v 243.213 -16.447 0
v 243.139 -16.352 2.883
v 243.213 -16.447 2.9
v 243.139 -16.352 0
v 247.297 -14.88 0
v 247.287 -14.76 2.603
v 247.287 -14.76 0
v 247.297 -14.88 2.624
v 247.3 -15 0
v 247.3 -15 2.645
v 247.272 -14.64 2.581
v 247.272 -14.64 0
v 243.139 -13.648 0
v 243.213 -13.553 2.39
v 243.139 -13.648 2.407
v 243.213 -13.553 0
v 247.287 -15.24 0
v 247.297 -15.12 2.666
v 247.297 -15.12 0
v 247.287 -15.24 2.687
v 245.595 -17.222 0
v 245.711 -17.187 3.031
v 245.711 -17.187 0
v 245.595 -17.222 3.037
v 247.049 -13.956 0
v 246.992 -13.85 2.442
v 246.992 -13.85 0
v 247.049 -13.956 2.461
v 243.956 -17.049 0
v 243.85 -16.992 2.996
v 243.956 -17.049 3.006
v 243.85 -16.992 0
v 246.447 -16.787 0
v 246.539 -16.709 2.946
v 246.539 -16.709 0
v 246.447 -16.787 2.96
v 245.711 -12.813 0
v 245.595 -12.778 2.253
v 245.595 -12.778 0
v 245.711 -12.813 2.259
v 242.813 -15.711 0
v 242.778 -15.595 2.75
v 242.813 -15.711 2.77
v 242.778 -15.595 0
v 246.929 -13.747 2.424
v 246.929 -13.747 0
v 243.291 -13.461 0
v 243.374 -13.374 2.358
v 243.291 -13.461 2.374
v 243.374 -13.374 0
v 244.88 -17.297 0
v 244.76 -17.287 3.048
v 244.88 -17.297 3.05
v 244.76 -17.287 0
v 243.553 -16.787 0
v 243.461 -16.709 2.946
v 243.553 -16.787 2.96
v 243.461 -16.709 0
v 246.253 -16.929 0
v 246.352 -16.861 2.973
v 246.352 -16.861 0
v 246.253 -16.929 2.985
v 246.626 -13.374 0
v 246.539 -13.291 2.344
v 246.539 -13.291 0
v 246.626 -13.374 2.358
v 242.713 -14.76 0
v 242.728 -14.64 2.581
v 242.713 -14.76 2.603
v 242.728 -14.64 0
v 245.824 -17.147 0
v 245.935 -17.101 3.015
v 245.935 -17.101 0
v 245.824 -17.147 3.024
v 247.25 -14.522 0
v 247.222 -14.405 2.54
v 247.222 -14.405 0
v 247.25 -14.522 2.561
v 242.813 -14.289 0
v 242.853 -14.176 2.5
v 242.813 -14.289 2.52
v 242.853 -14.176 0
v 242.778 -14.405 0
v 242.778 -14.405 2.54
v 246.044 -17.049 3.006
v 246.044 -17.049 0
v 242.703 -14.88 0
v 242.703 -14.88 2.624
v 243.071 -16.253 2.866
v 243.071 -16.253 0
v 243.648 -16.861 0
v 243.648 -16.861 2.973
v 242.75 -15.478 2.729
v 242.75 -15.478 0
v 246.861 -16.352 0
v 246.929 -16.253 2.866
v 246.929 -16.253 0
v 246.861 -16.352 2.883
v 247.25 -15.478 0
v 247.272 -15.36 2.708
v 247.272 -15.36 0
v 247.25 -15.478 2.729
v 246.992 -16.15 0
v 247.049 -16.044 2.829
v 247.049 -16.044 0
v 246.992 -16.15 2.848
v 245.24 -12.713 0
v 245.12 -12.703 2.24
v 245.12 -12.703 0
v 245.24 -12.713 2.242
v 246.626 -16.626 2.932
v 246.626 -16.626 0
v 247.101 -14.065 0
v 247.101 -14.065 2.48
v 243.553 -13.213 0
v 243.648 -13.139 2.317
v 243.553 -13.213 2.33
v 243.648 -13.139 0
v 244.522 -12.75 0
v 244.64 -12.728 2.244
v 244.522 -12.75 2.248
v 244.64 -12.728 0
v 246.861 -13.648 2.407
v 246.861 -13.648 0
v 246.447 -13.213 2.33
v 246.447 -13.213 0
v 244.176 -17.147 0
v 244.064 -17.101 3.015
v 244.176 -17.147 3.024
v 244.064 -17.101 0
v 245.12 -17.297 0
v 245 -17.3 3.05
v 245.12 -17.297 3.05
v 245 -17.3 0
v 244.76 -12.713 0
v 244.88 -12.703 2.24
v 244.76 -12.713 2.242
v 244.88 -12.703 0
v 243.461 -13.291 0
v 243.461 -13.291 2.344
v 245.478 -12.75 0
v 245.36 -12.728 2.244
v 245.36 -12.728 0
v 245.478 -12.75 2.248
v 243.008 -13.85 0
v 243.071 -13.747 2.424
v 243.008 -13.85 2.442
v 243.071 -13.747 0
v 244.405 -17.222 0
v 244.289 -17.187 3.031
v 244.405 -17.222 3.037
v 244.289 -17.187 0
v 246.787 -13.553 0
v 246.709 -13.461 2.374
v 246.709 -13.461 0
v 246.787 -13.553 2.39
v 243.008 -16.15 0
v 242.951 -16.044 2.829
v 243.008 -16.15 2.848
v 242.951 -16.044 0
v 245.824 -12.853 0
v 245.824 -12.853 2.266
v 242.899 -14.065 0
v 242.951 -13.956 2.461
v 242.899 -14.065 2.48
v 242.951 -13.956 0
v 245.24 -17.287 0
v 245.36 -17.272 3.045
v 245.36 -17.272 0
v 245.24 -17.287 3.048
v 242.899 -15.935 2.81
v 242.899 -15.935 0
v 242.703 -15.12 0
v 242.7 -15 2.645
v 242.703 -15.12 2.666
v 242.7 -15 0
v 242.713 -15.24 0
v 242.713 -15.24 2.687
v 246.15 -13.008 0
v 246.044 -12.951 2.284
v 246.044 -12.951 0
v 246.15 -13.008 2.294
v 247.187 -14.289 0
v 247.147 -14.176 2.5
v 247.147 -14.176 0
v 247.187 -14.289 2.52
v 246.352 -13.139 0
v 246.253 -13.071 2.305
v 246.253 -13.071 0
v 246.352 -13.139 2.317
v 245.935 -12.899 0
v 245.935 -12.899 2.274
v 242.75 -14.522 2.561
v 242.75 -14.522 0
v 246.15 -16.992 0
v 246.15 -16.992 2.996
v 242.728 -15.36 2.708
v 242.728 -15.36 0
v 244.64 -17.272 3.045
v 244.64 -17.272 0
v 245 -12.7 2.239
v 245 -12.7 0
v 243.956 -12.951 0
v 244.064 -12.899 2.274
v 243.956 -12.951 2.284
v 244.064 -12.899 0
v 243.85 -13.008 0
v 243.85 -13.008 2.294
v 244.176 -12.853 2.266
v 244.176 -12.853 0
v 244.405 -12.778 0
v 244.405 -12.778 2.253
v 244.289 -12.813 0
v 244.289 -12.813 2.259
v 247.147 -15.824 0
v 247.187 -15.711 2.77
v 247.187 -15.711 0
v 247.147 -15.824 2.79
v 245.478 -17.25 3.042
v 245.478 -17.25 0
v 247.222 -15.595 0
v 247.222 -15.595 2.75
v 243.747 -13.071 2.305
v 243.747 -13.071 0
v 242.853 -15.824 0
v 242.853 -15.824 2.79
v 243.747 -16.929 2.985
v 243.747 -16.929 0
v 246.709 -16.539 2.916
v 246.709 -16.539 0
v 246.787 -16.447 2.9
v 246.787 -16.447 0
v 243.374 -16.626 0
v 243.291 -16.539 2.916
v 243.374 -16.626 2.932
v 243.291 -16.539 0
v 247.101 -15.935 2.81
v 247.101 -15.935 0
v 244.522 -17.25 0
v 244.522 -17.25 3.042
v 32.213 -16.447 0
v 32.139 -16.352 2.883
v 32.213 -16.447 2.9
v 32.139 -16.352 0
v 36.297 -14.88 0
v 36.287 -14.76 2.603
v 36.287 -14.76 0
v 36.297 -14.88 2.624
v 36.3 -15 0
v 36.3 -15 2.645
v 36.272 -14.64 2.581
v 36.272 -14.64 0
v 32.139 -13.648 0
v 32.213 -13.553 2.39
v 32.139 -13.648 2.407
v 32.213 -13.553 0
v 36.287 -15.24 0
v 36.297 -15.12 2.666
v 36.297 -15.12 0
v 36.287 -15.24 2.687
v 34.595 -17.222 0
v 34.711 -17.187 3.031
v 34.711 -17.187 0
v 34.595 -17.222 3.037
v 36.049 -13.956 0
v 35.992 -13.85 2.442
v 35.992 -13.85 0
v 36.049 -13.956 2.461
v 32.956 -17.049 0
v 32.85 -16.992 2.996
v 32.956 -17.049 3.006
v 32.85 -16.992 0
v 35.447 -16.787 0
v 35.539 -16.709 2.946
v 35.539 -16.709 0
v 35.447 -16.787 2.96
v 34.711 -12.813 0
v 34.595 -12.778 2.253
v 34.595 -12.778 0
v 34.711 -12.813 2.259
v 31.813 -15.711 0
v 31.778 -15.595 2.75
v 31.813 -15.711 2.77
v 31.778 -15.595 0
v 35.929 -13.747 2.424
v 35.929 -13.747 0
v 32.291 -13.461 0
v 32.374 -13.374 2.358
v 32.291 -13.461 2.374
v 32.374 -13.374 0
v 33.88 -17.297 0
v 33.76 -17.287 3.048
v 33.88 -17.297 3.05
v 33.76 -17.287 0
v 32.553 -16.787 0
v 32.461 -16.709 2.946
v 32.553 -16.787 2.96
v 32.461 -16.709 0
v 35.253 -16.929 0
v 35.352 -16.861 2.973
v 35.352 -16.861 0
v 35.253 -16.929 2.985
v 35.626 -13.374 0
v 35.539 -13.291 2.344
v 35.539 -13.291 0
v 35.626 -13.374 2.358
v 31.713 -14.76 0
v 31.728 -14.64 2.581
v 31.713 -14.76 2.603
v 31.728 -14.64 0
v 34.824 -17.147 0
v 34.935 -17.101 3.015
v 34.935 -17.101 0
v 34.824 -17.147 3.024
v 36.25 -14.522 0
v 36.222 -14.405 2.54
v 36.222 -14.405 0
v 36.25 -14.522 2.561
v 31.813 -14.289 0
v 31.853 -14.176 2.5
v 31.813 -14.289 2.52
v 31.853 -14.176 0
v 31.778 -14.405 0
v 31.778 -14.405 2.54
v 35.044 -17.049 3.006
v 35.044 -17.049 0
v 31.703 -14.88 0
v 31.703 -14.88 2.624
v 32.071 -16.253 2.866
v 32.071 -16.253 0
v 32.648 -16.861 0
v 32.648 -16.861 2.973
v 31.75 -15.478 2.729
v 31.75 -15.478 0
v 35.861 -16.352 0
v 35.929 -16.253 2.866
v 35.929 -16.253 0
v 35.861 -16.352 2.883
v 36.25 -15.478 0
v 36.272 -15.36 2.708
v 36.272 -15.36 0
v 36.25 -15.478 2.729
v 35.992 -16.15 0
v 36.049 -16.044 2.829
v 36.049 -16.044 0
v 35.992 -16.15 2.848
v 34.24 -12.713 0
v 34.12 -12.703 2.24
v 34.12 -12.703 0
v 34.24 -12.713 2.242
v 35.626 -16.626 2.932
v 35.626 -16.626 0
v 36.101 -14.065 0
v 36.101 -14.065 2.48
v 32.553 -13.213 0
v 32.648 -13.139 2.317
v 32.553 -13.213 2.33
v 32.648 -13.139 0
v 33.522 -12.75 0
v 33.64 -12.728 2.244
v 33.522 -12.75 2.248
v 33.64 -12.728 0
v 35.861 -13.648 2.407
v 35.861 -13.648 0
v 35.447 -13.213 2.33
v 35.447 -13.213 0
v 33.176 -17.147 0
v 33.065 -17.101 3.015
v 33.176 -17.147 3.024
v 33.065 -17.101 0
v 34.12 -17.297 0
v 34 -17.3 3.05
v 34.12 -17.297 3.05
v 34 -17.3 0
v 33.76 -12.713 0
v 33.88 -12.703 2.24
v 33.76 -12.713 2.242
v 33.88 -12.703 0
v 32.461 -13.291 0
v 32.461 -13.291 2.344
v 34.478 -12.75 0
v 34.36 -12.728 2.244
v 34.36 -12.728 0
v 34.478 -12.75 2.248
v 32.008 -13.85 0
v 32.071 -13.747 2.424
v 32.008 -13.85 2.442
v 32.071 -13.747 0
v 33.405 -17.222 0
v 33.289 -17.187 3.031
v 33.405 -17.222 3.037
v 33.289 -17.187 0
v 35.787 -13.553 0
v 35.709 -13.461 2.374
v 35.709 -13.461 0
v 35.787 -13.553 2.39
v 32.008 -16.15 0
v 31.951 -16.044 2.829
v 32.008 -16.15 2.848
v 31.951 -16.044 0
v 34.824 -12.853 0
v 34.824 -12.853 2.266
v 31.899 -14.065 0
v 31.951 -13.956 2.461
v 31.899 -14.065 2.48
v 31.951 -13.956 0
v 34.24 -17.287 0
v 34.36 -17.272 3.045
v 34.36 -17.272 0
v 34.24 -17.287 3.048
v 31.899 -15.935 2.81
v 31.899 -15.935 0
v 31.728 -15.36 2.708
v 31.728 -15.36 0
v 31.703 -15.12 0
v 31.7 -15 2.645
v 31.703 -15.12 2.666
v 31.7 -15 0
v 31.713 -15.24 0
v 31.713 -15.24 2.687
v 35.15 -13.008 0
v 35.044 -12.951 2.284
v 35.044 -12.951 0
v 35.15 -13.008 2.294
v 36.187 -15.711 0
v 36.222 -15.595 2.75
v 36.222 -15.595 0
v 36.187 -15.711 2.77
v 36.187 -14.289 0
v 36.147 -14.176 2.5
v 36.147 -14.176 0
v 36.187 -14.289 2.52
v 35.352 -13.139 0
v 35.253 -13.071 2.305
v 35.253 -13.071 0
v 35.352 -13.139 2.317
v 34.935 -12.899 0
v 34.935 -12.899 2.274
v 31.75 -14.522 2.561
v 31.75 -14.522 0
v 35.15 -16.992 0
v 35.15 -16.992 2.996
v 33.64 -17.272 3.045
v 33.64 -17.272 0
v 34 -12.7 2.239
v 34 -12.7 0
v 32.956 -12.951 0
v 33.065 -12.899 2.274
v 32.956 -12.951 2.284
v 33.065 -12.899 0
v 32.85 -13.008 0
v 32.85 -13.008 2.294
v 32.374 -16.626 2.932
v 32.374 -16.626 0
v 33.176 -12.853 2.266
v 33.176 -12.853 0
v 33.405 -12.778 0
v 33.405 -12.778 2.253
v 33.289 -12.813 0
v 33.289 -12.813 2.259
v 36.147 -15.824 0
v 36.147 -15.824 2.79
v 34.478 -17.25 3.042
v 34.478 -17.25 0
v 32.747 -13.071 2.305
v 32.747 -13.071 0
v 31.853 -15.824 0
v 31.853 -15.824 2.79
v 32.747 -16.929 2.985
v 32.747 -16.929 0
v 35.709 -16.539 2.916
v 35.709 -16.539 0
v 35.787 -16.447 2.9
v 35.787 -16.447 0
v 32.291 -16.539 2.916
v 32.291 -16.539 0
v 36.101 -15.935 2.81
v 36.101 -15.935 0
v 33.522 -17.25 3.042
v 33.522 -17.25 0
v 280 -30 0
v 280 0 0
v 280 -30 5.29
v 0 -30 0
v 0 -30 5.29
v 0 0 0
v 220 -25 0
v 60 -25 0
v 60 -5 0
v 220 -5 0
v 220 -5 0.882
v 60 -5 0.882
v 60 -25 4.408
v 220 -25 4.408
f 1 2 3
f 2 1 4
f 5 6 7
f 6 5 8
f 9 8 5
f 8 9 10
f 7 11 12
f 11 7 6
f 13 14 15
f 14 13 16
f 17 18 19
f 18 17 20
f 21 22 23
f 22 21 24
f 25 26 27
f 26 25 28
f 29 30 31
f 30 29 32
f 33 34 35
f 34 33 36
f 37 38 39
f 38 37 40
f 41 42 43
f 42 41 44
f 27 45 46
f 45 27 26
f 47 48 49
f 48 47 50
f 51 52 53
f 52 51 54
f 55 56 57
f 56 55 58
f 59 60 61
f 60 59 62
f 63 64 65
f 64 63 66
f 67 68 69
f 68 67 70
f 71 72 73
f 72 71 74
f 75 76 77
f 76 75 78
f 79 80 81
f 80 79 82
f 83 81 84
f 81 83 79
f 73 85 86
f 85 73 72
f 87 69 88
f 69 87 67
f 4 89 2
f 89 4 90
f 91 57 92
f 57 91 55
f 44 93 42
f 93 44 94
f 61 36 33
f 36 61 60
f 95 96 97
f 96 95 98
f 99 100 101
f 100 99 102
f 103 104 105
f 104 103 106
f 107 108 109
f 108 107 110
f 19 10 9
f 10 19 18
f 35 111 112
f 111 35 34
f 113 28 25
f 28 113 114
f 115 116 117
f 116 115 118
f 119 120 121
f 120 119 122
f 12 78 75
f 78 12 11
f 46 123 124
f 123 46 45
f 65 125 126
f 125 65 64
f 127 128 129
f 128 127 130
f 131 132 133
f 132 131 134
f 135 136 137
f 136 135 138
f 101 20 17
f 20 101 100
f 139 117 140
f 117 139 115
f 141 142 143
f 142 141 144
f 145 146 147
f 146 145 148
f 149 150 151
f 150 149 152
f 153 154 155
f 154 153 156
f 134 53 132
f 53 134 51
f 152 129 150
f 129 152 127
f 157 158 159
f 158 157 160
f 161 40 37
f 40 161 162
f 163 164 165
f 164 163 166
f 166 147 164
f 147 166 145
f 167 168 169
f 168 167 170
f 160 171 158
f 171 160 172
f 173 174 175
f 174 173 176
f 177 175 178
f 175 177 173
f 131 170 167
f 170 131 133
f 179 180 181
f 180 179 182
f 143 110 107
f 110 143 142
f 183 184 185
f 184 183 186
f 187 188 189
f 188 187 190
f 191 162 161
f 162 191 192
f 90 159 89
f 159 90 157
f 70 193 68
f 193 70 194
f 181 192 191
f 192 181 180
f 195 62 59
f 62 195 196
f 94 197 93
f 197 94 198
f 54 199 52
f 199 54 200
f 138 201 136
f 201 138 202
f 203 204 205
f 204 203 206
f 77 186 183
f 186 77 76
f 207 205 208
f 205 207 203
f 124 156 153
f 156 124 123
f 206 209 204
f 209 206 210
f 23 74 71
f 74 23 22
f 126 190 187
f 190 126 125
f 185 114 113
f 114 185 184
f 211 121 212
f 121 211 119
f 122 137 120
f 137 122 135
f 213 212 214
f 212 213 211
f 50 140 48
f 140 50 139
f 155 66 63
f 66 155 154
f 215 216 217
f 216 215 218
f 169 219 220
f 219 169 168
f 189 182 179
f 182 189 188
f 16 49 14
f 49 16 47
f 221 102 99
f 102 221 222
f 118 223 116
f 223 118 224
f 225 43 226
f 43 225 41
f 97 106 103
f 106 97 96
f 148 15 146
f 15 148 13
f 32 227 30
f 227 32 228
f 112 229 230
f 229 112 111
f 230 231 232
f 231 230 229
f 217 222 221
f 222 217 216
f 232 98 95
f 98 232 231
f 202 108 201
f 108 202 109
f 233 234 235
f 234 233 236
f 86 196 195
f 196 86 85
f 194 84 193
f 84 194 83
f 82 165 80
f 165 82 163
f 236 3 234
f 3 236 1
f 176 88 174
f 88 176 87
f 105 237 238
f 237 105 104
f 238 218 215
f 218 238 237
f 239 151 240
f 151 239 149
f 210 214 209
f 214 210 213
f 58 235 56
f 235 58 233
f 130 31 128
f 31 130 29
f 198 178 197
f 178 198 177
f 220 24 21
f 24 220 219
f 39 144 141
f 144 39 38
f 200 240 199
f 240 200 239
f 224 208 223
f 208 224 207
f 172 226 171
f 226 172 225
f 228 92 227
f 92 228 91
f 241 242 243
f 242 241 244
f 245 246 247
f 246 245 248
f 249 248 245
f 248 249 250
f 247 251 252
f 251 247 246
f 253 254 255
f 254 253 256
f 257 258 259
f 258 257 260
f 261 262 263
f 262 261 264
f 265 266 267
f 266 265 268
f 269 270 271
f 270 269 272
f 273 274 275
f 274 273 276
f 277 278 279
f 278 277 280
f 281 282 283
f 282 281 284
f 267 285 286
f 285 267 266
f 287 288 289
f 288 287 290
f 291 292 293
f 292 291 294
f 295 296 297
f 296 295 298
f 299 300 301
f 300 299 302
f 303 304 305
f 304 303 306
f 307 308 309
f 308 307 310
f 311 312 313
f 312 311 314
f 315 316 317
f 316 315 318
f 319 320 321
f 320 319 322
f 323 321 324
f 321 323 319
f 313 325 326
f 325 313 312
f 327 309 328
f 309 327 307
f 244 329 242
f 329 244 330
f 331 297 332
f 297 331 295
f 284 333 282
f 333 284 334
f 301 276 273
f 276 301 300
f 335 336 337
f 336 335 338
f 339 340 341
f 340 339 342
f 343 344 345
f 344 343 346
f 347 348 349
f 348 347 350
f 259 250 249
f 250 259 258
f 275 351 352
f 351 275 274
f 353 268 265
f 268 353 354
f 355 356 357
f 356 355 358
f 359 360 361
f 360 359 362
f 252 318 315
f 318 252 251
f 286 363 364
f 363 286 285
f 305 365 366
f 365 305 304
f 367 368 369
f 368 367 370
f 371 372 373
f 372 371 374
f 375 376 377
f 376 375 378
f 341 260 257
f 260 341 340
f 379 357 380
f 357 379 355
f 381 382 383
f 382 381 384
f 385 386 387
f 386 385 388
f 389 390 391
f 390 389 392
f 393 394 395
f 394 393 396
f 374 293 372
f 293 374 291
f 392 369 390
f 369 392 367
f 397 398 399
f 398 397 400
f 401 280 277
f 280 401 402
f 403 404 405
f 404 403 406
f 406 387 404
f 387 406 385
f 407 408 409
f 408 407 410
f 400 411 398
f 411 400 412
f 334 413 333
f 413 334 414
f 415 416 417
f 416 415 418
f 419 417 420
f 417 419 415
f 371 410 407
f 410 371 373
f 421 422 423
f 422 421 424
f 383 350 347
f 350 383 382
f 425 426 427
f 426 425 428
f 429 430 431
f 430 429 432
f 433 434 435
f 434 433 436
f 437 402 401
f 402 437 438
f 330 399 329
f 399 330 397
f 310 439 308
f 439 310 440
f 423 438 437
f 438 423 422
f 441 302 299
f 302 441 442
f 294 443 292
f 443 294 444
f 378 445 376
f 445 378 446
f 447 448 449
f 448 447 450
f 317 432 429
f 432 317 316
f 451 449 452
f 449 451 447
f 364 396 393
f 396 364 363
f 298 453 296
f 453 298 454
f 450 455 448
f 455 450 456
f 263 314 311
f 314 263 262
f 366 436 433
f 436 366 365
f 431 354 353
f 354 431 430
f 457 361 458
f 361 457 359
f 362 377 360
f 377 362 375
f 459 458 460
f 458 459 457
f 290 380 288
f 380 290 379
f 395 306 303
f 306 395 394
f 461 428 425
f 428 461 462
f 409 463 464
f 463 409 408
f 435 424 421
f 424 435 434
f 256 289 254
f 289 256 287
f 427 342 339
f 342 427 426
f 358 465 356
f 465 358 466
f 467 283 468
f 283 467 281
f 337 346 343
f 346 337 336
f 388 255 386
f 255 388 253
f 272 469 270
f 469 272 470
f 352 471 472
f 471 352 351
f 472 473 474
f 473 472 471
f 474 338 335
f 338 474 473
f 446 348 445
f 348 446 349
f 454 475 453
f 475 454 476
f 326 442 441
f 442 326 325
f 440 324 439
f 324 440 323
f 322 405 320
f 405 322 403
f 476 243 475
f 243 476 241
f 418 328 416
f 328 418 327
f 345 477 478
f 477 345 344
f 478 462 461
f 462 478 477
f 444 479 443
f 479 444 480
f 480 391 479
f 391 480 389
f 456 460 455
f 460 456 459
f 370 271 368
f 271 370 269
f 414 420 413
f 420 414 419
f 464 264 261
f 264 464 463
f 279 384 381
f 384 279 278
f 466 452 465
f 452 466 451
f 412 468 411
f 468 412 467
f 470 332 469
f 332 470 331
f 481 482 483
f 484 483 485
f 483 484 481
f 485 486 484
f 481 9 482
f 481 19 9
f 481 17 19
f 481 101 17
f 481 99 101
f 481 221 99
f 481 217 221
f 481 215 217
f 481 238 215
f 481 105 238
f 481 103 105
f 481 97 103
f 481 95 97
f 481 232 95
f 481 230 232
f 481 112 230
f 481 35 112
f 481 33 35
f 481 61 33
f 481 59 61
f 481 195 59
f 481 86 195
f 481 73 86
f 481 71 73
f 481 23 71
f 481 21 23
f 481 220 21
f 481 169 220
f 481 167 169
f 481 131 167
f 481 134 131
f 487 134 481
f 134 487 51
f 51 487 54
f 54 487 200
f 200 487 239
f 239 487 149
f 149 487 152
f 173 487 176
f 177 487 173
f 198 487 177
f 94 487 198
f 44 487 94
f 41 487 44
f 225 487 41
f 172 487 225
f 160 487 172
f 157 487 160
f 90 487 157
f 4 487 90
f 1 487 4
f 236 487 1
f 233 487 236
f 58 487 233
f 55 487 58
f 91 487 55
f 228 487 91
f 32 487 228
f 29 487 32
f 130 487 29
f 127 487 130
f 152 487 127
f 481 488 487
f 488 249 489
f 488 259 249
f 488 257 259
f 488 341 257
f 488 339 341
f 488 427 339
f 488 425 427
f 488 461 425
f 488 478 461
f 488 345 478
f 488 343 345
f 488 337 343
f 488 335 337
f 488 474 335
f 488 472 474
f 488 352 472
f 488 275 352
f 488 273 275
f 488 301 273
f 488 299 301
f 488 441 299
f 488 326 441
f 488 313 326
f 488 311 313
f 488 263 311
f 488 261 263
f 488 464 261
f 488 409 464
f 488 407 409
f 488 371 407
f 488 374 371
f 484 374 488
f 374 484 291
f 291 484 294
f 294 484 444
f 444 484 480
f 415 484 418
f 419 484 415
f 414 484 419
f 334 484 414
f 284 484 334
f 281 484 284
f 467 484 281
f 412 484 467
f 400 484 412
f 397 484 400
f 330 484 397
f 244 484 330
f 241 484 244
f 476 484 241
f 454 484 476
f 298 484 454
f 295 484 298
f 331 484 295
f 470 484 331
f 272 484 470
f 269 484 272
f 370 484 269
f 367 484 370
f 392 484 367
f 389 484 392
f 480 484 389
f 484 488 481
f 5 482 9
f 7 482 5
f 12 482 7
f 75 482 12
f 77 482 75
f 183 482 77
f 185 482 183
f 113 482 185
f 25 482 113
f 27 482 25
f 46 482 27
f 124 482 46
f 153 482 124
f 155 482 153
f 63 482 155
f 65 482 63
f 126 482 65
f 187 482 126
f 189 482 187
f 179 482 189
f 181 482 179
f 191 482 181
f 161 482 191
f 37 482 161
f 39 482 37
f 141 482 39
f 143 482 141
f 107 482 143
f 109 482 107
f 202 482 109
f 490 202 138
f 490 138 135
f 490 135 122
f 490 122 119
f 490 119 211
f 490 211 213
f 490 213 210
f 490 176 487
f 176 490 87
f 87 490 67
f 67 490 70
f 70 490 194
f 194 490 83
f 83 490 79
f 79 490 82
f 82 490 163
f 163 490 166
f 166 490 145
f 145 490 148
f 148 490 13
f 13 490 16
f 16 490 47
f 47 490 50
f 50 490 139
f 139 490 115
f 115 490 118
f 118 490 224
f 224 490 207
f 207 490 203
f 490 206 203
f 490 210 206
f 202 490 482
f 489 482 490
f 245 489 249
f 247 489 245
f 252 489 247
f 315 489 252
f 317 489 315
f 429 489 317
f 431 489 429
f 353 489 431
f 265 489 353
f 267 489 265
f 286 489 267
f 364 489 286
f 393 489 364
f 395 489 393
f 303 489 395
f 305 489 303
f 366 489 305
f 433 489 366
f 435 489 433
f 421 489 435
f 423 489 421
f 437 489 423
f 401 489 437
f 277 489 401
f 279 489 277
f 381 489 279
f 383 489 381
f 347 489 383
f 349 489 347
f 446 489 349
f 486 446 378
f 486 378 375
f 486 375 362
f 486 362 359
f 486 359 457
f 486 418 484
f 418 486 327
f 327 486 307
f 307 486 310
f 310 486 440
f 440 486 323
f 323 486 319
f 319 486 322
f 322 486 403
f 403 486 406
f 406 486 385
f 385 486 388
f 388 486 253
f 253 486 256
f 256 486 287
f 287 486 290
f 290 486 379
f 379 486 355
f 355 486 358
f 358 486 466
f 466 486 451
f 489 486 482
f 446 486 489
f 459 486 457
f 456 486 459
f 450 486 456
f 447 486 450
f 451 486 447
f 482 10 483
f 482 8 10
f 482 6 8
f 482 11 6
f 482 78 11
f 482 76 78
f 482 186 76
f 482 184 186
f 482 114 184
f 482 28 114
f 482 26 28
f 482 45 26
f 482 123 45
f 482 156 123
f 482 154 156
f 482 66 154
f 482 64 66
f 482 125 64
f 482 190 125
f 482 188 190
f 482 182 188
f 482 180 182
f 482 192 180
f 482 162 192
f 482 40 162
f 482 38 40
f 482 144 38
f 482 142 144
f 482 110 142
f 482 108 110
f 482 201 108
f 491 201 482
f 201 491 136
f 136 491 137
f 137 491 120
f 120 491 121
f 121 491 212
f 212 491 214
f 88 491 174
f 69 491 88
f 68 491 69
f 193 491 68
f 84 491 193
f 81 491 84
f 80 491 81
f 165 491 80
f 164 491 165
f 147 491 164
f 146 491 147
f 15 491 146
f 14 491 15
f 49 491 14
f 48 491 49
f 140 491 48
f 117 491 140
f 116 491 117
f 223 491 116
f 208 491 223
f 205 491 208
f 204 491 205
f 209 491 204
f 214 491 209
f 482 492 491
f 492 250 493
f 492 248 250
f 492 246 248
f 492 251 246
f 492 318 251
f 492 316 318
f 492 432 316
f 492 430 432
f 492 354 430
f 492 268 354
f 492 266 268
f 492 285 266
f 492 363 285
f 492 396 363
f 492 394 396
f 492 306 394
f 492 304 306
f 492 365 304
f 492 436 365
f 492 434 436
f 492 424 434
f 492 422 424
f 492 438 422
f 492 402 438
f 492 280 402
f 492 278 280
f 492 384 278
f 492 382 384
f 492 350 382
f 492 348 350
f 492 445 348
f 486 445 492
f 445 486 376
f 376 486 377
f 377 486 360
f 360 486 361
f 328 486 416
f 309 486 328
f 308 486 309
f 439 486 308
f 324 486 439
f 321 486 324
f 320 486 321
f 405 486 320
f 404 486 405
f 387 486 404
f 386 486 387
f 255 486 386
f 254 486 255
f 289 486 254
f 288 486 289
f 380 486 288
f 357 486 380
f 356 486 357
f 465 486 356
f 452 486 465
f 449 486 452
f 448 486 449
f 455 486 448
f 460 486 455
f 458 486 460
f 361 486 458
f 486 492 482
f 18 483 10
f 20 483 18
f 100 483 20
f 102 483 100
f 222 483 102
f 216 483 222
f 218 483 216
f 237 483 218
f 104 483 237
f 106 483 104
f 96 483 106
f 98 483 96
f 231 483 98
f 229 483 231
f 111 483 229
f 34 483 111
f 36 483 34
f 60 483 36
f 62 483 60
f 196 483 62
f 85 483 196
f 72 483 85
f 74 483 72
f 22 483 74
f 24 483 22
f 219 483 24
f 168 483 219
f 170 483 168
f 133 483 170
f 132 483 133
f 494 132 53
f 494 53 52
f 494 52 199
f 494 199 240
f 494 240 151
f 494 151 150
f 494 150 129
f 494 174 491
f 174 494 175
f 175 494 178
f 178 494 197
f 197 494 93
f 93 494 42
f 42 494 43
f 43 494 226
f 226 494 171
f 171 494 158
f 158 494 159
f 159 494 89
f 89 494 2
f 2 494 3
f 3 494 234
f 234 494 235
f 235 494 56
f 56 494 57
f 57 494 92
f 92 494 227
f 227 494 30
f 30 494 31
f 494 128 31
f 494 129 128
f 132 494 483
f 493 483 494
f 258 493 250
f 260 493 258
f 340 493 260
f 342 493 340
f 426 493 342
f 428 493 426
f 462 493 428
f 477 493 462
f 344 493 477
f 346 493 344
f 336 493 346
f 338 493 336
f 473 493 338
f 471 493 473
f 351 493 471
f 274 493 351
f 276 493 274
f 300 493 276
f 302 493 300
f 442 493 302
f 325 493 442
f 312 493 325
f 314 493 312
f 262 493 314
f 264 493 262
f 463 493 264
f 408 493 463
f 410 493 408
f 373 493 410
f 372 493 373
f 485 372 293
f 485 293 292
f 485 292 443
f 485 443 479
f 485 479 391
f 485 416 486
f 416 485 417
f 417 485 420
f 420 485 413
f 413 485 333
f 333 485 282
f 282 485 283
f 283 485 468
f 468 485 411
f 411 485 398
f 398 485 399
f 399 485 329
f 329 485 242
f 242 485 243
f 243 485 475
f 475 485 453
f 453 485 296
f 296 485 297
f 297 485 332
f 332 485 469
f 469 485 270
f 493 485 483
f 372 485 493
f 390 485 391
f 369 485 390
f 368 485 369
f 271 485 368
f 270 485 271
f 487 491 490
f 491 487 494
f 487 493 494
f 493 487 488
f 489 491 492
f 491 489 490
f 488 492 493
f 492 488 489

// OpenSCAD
module holder1()
{
    difference()
    {
        cube([280,35,30]);
        union()
        {
            translate([0*34+0*4+34/2, 34/2+4,-1]) cylinder(r=3.5, h=40, $fn=120);
            translate([1*34+1*4+34/2, 34/2+4,-1]) cylinder(r=3.5, h=40, $fn=120);
            translate([2*34+2*4+34/2, 34/2+4,-1]) cylinder(r=3.5, h=40, $fn=120);
            translate([3*34+3*4+34/2, 34/2+4,-1]) cylinder(r=3.5, h=40, $fn=120);
            translate([4*34+4*4+34/2, 34/2+4,-1]) cylinder(r=3.5, h=40, $fn=120);
            translate([4.8*34+4.8*4+34/2, 34/2+4,-1]) cylinder(r=3.5, h=40, $fn=120);
            translate([5.6*34+5.6*4+34/2, 34/2+4,-1]) cylinder(r=3.5, h=40, $fn=120);
            translate([6.4*34+6.4*4+34/2, 34/2+4,-1]) cylinder(r=3.5, h=40, $fn=120);
            
            translate([6*34+ 6*4+34/2,-1,15]) rotate([270,0,0])cylinder(r=2.3, h=70, $fn=120);
            translate([6*34+ 6*4+34/2,31,15]) rotate([270,0,0])cylinder(r1=0, r2=15, h=10, $fn=120);
            
            translate([1*34,-1,15]) rotate([270,0,0])cylinder(r=2.3, h=70, $fn=120);
            translate([1*34,31,15]) rotate([270,0,0])cylinder(r1=0, r2=15, h=10, $fn=120);
            
        }
    }
}

module holder2()
{
    difference()
    {
        holder1();
        union()
        {
            translate([-5,0,0]) rotate([-10,0,0]) cube([500, 100, 80]);
            translate([60, -20, 5]) cube([160,200,20]);
        }
    }    
}

rotate([90,0,0]) holder2();
